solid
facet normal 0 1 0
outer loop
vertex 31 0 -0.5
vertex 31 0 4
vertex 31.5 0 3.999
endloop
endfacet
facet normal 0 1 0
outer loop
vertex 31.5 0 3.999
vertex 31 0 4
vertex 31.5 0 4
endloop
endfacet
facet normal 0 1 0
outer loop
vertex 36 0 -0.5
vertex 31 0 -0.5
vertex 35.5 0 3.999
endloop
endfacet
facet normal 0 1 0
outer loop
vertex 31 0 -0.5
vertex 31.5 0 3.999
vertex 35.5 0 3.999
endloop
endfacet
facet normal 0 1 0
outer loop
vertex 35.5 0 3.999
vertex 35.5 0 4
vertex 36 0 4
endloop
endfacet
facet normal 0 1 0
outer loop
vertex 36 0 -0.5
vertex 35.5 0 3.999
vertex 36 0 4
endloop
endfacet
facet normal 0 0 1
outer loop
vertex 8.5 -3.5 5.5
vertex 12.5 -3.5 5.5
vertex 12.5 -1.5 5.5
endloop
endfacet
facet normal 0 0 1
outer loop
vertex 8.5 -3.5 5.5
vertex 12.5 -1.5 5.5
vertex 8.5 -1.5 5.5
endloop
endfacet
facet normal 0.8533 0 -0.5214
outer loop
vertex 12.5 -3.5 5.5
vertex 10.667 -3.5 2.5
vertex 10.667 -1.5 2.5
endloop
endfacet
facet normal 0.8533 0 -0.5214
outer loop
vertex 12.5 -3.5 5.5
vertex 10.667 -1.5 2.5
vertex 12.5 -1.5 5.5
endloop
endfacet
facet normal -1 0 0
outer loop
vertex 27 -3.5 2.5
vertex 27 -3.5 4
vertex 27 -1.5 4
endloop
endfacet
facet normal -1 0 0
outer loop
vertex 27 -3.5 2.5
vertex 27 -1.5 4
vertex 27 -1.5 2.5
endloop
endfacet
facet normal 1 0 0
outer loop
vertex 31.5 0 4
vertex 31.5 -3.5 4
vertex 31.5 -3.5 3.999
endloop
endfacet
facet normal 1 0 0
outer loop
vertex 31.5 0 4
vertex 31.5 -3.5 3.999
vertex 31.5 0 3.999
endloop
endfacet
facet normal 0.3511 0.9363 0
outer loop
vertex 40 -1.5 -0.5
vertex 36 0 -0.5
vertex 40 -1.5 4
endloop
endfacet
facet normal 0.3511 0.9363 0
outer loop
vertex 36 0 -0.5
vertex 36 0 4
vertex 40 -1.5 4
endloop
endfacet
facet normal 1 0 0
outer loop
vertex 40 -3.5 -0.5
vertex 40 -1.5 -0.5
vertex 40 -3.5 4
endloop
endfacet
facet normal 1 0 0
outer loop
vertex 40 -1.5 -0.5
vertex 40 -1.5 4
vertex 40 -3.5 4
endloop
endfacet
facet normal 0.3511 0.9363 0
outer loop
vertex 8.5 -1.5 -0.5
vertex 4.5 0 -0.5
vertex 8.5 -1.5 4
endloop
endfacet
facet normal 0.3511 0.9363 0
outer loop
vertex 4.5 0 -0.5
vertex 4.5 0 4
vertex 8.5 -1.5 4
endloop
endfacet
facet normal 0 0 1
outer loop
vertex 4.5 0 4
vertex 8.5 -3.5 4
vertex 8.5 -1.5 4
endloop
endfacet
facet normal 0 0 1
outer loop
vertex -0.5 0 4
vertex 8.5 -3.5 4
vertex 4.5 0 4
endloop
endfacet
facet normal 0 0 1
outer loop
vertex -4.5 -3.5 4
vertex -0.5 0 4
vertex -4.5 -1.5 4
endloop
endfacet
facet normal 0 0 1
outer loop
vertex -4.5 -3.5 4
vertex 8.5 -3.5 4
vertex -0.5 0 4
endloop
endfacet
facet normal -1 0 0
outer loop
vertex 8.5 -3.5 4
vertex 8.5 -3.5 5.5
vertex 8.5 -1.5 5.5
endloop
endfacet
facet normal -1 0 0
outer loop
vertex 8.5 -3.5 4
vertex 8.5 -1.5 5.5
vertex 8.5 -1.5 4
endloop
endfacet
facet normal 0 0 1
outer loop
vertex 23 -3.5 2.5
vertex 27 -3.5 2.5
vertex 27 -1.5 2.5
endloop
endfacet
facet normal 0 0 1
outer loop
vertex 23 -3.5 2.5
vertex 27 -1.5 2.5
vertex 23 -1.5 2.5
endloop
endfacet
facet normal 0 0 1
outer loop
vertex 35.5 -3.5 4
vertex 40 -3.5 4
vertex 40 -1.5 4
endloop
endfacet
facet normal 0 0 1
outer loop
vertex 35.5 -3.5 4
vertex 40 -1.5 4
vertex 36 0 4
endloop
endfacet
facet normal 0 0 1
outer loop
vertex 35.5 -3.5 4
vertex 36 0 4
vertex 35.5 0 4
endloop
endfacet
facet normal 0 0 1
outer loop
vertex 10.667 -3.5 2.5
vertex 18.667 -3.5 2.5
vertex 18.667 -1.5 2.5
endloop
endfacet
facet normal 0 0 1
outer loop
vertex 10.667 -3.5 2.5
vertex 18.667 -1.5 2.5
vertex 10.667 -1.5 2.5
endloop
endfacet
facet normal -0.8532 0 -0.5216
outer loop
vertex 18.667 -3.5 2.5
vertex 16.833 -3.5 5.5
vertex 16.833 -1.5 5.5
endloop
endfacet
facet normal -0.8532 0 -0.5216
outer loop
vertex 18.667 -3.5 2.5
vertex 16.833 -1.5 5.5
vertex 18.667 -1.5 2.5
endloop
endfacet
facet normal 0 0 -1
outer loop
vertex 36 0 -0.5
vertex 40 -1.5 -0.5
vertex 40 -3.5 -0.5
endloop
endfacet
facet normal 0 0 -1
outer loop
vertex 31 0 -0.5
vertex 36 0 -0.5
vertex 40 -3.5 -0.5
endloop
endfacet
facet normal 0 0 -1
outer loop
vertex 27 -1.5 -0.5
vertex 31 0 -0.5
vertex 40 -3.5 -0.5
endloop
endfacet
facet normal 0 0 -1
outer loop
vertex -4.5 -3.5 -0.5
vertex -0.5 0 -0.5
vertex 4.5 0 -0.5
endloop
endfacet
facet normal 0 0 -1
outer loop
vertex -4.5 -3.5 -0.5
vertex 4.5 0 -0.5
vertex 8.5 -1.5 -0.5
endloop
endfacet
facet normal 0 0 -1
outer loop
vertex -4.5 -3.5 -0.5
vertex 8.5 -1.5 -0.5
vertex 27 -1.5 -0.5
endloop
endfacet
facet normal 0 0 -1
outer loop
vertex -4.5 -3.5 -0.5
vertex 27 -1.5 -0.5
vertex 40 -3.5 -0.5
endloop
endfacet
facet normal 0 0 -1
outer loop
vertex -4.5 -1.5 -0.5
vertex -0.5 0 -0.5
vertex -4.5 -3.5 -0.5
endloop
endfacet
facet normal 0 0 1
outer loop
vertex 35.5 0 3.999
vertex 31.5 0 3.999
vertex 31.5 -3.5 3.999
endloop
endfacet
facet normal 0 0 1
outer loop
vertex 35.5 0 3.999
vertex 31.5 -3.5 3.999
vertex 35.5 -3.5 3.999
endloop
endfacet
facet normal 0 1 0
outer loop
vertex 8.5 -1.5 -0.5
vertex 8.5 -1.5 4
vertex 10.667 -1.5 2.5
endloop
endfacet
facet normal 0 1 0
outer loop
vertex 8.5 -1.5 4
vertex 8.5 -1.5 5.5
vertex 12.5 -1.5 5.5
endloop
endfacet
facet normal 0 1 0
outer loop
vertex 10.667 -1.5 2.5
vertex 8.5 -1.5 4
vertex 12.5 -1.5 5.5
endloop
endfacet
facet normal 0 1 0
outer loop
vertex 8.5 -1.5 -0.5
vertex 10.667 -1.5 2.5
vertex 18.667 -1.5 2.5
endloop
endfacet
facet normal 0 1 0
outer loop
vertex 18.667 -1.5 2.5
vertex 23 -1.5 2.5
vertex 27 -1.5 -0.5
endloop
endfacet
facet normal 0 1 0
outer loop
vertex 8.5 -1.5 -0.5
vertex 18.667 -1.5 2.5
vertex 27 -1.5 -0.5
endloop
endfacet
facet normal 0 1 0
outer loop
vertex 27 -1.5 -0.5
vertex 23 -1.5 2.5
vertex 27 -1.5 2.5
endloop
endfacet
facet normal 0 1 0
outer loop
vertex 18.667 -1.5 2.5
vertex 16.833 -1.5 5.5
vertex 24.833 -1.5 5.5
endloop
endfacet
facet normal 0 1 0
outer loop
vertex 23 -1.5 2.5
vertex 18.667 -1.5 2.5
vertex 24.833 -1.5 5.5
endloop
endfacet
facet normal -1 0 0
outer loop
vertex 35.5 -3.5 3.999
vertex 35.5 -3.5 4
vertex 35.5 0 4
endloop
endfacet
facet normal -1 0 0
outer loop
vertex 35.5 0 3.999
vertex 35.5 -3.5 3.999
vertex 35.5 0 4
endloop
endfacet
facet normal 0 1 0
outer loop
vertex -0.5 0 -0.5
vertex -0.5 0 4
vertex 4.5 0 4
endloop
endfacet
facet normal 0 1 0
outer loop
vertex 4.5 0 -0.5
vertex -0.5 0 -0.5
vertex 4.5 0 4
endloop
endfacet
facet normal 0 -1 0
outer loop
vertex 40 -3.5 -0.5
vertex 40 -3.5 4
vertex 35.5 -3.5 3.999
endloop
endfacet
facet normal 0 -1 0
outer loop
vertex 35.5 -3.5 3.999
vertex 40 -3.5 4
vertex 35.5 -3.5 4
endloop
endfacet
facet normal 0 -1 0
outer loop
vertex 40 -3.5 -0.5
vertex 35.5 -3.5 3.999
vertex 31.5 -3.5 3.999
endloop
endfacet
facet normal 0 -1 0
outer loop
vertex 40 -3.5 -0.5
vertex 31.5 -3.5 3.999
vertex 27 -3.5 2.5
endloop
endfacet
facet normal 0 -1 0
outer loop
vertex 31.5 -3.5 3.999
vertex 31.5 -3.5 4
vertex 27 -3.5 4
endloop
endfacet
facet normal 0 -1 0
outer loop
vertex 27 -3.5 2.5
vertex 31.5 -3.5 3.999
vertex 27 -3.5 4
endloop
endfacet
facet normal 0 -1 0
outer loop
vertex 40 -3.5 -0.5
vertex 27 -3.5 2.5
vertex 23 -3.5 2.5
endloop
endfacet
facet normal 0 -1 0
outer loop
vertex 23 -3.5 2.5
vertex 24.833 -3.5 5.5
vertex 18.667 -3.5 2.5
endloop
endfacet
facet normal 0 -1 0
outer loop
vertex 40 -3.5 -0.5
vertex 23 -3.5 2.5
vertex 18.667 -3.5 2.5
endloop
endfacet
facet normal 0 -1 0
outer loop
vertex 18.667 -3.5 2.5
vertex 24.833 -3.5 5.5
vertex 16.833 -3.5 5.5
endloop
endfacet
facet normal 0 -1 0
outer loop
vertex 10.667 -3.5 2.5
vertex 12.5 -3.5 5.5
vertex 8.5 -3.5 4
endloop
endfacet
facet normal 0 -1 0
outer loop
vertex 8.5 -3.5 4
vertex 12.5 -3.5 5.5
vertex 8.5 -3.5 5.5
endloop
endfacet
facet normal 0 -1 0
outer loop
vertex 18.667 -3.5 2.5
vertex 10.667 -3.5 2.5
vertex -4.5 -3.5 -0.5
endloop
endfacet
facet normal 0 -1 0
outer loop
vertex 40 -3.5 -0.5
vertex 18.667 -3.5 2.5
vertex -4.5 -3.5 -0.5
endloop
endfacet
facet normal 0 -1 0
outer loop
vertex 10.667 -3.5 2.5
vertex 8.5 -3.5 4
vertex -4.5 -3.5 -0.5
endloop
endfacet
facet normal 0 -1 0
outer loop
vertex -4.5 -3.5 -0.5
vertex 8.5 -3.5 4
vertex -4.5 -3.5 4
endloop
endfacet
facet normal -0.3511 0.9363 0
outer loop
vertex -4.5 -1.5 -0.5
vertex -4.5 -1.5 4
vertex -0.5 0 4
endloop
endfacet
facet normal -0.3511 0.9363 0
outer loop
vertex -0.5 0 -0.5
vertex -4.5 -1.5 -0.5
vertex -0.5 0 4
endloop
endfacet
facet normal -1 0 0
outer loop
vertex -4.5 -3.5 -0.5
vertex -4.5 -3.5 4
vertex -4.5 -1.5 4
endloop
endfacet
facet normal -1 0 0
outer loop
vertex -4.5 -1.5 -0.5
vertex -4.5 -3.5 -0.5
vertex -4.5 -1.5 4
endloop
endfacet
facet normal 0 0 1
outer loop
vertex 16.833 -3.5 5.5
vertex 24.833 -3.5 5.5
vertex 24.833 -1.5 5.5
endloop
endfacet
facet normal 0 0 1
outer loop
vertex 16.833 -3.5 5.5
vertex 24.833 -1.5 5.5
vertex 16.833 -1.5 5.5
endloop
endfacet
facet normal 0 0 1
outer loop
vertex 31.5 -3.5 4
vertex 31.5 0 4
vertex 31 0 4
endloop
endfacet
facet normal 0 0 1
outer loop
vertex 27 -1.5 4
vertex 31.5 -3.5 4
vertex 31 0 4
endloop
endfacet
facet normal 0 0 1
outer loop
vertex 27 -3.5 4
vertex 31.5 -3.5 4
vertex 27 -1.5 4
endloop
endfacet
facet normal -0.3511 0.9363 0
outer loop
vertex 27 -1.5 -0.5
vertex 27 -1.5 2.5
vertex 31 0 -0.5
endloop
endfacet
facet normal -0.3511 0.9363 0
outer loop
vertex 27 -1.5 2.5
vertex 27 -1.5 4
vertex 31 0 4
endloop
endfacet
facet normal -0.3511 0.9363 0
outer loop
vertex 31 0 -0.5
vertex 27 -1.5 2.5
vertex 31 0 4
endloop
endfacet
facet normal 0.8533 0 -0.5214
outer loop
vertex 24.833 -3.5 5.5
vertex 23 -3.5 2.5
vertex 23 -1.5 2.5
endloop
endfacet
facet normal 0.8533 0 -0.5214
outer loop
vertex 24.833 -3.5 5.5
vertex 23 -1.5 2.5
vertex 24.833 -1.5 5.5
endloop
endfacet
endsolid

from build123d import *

# Parameters (mm, degrees)
EXTRUDE_1_DEPTH     = 4
CUT_EXTRUDE_START   = -2
CUT_EXTRUDE_6_DEPTH = 3.5
EXTRUDE_2_DEPTH     = 0.5
SKETCH_8_W          = 4
SKETCH_8_H          = 3.5
CUT_EXTRUDE_7_DEPTH = 0.001


# Read off the part's stored shape, not the designer's step: the extrude step
with BuildPart() as part:
    # 草图4 → 凸台-拉伸1 (new body)
    with BuildSketch(Plane.XY):
        Polygon((17.75, -1.5), (8.5, -1.5), (4.5, 0), (4, 0), (0, 0), (-0.5, 0), (-4.5, -1.5), (-4.5, -3.5), (17.75, -3.5), align=None)
    extrude(amount=EXTRUDE_1_DEPTH)

    # 镜向1: part across plane


with BuildPart() as part_1:
    add(part.part)
    add(part.part.mirror(Plane.XY.offset(4)))

    # 镜向2: part across plane


with BuildPart() as part_2:
    add(part_1.part)
    add(part_1.part.mirror(Plane(origin=(17.75, 0, 4), x_dir=(0, 0, 1), z_dir=(1, 0, 0))))

    # 切除-拉伸6 outline → 切除-拉伸6 (cut)
    with BuildSketch(Plane(origin=(0, -1.5, 0), x_dir=(1, 0, 0), z_dir=(0, 1, 0)).offset(CUT_EXTRUDE_START)):
        Polygon((8.5, -4), (-4.5, -4), (-4.5, -8), (40, -8), (40, -4), (27, -4), (27, -2.5), (23, -2.5), (24.833333333, -5.5), (16.833333333, -5.5), (18.666666667, -2.5), (10.666666667, -2.5), (12.5, -5.5), (8.5, -5.5), align=None)
    extrude(amount=CUT_EXTRUDE_6_DEPTH, mode=Mode.SUBTRACT)

    # 草图7 → 凸台-拉伸2 (add)
    with BuildSketch(Plane(origin=(0, 0, 0), x_dir=(-1, 0, 0), z_dir=(0, 0, -1))):
        Polygon((0.5, 0), (-4.5, 0), (-8.5, -1.5), (-27, -1.5), (-31, 0), (-36, 0), (-40, -1.5), (-40, -3.5), (4.5, -3.5), (4.5, -1.5), align=None)
    extrude(amount=EXTRUDE_2_DEPTH)

    # 草图8 → 切除-拉伸7 (cut)
    with BuildSketch(Plane.XY.offset(4)):
        with Locations((33.5, -1.75)):
            Rectangle(SKETCH_8_W, SKETCH_8_H)
    extrude(amount=-CUT_EXTRUDE_7_DEPTH, mode=Mode.SUBTRACT)


solid = part_2.part
